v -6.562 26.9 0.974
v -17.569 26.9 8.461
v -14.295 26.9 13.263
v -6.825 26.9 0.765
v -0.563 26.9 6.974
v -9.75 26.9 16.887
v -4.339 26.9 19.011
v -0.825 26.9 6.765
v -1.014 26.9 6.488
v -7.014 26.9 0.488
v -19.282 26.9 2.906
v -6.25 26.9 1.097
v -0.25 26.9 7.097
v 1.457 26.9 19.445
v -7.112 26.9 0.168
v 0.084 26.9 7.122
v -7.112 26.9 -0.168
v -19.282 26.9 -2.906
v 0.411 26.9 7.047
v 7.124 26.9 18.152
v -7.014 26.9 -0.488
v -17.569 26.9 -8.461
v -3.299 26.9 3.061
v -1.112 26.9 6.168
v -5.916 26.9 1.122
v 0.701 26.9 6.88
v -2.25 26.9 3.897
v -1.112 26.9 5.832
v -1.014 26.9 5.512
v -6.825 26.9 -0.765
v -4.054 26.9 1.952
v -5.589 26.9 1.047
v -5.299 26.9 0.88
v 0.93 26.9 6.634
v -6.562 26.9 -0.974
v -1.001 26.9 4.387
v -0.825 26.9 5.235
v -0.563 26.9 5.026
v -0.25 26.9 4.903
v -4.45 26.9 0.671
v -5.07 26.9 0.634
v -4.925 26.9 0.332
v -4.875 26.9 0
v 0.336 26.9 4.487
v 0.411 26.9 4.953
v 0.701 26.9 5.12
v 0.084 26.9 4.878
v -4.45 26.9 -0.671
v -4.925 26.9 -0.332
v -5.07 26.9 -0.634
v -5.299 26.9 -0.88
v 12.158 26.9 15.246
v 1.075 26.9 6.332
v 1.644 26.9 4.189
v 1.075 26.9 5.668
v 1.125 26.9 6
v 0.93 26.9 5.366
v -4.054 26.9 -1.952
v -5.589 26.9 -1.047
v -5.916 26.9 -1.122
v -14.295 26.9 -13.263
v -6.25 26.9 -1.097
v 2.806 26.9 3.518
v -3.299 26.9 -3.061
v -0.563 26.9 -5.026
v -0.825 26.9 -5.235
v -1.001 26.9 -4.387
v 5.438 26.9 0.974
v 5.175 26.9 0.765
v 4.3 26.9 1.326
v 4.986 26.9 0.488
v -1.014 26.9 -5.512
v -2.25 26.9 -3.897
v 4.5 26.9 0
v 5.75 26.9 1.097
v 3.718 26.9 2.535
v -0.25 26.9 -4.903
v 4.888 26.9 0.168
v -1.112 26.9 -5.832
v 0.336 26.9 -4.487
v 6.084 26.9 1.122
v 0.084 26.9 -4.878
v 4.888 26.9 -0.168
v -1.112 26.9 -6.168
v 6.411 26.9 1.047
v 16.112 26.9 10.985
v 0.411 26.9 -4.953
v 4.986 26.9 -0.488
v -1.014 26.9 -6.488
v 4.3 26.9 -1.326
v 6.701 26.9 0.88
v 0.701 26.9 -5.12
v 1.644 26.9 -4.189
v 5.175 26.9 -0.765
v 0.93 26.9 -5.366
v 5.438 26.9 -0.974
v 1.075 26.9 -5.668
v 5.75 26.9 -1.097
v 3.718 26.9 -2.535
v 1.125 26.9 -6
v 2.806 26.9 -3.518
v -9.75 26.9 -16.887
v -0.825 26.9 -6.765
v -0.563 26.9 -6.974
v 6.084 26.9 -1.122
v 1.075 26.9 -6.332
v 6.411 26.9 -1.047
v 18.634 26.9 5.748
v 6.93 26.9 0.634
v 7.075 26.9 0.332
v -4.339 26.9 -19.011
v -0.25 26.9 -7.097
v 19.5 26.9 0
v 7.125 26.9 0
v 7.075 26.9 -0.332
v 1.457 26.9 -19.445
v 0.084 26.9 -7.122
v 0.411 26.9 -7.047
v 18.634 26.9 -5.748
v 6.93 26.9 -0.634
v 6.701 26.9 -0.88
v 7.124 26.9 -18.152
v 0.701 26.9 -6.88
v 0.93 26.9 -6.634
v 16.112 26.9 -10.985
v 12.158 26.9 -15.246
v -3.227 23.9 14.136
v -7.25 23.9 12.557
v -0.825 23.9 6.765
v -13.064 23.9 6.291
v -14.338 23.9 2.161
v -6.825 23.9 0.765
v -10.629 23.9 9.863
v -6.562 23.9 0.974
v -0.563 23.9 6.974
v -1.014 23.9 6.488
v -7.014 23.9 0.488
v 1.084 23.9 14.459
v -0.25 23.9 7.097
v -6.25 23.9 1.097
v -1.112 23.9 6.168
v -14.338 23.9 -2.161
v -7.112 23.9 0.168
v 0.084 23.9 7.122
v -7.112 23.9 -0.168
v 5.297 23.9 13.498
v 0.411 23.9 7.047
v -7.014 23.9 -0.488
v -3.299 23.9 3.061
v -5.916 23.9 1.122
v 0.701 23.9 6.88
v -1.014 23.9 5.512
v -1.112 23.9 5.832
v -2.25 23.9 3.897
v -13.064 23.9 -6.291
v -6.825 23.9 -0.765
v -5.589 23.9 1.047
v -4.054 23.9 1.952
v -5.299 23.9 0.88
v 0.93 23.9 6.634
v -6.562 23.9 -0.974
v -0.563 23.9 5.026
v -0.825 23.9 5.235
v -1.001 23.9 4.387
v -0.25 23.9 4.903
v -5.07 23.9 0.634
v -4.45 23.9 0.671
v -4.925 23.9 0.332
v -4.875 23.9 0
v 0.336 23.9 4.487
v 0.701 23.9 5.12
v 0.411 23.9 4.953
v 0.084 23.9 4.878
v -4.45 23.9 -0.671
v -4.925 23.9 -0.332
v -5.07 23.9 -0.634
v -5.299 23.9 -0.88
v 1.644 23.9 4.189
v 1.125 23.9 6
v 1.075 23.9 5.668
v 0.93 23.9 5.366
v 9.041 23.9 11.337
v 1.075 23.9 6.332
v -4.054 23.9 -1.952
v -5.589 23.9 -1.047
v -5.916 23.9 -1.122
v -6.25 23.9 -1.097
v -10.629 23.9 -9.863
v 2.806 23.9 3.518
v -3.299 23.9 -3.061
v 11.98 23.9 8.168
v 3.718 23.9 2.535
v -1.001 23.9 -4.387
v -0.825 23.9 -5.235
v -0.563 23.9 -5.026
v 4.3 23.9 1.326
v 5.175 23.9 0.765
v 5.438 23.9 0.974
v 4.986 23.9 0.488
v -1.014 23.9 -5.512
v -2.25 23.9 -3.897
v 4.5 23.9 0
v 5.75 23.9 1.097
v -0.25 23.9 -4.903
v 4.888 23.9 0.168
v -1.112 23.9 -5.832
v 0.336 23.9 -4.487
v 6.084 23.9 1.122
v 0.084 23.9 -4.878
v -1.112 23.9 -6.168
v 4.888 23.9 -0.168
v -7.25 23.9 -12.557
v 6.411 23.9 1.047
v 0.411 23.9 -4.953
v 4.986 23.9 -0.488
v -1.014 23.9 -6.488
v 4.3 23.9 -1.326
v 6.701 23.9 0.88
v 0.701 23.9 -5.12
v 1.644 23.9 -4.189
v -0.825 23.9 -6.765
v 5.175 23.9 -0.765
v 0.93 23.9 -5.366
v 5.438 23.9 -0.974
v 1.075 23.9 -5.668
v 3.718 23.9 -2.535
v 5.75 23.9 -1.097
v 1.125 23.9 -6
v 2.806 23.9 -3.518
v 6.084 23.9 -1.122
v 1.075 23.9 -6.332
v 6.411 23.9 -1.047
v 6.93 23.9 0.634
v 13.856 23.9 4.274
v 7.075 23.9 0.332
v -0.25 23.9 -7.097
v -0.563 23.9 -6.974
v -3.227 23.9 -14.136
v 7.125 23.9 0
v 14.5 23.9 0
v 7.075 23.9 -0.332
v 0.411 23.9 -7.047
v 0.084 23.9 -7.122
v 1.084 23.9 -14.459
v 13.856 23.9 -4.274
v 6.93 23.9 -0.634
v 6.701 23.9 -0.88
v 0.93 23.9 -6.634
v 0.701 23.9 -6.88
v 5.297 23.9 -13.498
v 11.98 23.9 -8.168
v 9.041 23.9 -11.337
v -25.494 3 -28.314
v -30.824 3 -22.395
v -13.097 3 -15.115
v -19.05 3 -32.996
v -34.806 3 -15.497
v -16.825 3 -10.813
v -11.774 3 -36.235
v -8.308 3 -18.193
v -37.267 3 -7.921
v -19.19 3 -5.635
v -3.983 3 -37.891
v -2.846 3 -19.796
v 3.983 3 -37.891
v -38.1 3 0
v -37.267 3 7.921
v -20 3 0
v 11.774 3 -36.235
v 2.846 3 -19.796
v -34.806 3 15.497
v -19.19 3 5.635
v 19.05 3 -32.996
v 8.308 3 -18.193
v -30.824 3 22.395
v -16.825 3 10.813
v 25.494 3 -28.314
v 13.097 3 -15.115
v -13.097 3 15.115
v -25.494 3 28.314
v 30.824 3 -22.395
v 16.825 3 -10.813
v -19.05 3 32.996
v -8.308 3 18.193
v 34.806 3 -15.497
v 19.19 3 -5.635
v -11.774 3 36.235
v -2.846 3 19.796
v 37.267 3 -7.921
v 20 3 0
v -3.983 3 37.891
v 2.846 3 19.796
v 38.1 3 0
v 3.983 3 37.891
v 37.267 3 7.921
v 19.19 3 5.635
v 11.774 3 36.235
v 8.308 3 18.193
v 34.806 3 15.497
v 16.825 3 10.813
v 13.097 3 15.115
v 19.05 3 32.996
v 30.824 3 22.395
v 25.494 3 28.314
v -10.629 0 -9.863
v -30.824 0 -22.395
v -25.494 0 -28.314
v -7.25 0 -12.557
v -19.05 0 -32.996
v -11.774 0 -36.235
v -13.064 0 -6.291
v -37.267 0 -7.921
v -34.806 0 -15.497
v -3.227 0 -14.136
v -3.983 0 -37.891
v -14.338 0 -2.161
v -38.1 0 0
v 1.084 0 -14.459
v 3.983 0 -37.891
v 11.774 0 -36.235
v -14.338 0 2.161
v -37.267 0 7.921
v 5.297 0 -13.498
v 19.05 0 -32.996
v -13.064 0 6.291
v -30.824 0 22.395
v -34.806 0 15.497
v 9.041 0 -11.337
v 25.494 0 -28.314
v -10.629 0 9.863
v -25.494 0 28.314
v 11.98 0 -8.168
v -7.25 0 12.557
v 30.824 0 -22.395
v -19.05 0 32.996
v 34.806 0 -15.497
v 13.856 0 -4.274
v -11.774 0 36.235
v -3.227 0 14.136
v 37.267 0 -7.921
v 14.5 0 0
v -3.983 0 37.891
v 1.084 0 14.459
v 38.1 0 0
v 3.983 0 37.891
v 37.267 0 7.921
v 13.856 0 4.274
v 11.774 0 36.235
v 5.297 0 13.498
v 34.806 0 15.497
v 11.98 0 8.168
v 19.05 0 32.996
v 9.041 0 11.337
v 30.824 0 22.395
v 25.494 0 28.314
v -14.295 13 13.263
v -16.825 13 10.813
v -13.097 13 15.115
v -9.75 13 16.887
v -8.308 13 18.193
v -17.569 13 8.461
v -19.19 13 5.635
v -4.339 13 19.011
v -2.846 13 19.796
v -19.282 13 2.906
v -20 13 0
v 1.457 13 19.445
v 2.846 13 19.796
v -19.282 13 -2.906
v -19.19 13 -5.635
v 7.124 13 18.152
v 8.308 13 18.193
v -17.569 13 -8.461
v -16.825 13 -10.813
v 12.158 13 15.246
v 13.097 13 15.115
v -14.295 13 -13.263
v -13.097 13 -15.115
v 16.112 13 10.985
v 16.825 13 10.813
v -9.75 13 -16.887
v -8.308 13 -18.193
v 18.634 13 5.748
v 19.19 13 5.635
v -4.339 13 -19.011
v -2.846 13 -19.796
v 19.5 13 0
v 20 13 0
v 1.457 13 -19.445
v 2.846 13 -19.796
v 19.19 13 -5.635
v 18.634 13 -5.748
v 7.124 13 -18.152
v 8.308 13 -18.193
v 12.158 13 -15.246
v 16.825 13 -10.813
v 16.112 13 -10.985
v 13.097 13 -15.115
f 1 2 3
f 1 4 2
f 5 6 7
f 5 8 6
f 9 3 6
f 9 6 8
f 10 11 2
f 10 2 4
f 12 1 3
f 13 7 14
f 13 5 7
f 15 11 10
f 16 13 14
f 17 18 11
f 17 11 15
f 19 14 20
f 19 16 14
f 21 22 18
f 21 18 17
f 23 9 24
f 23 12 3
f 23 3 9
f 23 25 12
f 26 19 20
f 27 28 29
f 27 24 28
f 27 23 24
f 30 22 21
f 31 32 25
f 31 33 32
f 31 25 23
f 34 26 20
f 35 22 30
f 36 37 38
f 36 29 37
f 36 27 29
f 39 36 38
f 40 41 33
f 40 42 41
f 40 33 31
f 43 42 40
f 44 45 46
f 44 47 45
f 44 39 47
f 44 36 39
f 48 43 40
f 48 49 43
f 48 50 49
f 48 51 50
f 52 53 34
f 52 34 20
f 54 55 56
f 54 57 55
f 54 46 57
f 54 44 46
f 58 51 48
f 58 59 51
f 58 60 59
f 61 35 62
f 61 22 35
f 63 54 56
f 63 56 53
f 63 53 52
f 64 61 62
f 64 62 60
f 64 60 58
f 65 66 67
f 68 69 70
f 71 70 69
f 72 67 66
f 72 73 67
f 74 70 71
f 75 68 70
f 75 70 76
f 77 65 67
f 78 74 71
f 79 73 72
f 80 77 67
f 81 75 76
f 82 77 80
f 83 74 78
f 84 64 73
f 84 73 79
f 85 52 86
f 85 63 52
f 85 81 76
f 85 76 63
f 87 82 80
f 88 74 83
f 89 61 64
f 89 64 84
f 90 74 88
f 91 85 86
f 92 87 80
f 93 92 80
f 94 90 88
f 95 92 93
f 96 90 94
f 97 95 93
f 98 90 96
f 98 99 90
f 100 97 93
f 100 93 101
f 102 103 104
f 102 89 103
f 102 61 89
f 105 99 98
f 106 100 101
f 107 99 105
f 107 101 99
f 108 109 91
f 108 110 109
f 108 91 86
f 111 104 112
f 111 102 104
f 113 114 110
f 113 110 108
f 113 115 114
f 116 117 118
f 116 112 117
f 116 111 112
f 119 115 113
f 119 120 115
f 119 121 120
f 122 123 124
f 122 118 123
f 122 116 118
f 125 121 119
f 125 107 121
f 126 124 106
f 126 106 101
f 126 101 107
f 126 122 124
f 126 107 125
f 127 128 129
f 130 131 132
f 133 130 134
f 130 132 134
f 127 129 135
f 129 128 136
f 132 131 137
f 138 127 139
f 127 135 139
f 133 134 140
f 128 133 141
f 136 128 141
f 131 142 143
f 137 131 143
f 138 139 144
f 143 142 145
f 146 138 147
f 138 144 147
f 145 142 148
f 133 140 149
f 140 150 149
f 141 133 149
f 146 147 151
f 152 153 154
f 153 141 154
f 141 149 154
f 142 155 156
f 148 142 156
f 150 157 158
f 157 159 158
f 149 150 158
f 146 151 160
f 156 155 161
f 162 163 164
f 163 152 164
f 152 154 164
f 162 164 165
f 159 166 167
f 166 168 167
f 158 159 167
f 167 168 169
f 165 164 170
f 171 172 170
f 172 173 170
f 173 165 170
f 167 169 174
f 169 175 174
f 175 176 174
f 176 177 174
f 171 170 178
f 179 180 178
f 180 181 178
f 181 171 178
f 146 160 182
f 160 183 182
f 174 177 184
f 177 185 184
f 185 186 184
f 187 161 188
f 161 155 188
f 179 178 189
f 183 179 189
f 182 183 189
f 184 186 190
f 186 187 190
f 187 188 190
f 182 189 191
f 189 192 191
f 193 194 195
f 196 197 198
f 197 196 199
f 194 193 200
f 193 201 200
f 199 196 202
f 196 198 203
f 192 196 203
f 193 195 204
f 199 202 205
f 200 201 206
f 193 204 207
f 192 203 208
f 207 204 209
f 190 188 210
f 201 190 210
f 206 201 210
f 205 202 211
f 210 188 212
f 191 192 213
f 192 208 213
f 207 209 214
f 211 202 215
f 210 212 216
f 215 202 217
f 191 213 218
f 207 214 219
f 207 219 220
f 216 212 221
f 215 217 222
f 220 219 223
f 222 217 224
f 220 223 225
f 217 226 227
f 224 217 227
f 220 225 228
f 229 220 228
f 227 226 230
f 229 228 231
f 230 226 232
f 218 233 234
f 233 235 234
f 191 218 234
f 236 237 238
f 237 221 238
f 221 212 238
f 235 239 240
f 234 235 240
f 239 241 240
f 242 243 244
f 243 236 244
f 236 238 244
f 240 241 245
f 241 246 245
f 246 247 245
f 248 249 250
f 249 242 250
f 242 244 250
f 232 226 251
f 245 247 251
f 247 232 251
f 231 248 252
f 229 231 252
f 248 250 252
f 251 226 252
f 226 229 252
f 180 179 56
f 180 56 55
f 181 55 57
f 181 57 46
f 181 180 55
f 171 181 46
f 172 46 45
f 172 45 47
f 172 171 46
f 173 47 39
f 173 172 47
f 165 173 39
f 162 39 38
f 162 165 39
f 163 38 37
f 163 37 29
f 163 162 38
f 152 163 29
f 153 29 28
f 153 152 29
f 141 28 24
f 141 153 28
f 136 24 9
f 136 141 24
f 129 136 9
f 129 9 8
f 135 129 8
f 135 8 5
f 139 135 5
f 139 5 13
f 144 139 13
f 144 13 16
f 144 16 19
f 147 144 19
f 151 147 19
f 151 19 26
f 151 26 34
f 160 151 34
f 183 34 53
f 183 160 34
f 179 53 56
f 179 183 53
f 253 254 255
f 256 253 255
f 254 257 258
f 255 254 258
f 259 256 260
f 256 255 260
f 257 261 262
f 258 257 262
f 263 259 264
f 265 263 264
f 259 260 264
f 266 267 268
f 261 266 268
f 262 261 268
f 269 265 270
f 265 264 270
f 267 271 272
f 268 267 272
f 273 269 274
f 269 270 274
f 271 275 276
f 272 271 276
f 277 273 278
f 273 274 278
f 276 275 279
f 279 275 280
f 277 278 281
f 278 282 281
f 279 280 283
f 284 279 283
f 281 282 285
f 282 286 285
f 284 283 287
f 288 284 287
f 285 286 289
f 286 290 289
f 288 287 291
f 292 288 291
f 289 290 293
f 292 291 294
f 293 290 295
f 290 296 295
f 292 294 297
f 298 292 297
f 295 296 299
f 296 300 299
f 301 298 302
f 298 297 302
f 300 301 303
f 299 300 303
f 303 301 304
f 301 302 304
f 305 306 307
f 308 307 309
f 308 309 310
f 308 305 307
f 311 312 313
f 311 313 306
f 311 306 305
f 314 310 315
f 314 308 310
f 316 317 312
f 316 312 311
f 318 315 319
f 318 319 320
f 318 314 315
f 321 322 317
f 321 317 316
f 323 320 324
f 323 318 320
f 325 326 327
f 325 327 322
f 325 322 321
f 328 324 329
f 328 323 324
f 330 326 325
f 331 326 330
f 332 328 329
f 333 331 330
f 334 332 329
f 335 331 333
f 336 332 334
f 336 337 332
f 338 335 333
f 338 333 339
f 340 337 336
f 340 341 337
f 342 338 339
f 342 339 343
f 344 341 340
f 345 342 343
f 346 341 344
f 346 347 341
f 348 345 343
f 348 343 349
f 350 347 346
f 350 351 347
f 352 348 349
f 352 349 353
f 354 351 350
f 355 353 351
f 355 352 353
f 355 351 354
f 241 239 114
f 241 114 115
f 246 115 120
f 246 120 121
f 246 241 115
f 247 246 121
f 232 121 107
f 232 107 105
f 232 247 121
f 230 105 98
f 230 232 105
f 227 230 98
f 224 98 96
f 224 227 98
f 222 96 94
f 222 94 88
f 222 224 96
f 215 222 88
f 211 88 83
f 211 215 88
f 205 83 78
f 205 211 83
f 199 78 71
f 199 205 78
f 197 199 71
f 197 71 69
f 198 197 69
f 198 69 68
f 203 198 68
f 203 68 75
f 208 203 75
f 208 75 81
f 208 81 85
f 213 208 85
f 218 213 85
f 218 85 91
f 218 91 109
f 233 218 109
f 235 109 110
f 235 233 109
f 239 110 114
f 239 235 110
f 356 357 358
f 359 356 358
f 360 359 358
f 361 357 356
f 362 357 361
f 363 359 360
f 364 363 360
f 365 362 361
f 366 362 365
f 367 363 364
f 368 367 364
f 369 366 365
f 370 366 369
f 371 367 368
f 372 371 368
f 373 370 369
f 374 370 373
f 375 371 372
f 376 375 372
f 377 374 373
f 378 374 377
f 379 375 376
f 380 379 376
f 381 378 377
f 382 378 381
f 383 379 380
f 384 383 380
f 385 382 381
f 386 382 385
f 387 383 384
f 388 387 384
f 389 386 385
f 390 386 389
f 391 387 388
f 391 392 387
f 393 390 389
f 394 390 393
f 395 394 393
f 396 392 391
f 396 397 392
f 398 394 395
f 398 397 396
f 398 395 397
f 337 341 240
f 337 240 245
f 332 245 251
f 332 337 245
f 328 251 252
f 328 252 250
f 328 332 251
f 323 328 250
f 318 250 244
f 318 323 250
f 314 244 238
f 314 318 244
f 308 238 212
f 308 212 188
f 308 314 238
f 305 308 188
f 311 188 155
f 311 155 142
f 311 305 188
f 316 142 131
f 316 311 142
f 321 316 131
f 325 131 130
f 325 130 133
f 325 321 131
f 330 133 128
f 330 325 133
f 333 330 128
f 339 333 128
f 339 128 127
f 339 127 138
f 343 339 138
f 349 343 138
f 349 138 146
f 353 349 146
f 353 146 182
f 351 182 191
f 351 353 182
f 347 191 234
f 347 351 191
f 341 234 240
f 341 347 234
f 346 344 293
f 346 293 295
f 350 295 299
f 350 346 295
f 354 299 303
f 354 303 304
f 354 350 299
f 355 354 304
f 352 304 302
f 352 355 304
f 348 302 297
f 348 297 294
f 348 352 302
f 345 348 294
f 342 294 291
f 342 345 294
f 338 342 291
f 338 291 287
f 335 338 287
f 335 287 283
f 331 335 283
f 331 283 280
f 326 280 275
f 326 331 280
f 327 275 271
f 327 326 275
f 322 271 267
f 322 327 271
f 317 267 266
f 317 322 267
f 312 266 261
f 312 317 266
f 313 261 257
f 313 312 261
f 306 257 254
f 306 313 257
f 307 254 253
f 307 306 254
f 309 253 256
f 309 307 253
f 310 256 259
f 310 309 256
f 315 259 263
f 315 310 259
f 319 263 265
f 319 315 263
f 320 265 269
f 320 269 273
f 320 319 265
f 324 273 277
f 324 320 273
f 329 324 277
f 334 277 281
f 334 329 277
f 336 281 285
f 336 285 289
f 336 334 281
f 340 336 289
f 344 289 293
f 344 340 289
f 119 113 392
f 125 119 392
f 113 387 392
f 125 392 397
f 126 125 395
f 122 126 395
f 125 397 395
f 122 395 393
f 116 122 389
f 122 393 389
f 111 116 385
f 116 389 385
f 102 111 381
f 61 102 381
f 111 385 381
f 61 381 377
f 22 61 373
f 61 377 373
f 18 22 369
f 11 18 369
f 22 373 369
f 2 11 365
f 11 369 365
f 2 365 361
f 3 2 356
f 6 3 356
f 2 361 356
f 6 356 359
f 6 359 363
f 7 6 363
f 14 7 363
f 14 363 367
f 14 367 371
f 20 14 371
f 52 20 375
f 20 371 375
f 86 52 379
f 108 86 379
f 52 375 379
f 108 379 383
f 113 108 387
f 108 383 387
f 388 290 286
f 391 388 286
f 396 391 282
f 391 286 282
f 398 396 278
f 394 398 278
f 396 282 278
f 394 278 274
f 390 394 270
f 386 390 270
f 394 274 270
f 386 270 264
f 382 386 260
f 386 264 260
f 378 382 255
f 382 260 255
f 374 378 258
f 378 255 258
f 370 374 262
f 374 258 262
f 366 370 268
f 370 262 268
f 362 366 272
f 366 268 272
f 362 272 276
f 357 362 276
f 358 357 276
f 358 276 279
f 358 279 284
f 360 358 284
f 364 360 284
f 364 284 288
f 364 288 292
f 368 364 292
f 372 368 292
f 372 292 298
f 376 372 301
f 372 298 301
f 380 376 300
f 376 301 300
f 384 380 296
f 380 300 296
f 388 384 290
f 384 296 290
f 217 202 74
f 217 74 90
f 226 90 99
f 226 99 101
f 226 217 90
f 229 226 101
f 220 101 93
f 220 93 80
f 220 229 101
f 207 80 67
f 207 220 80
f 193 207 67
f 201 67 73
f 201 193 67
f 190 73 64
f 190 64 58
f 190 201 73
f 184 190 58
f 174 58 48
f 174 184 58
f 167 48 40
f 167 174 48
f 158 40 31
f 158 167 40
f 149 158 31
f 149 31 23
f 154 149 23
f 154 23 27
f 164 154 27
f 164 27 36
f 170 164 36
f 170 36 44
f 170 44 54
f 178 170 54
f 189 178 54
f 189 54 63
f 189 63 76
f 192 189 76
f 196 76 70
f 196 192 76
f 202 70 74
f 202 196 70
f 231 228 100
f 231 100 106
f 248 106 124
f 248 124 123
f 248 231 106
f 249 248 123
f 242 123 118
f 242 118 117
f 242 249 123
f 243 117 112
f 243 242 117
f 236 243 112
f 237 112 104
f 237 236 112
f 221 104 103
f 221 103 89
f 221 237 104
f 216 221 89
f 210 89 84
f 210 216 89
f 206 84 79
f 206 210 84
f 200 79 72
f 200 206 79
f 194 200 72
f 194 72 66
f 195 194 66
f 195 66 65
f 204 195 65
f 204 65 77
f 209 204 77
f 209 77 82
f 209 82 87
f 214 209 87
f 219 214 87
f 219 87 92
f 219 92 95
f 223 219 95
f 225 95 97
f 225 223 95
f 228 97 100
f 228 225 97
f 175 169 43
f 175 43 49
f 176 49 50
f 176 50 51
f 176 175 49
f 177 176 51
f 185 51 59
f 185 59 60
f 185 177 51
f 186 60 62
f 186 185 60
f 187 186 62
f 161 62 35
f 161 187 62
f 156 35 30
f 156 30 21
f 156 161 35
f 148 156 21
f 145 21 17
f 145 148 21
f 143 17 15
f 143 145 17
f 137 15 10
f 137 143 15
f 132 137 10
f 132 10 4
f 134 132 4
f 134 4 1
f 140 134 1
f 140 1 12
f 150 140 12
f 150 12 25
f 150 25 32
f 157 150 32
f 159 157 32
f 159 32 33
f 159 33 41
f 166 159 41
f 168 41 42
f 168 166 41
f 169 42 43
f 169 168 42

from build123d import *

# Parameters (mm, degrees)
SKETCH1_R           = 19.5
SKETCH1_R_2         = 14.5
BOSS_EXTRUDE1_DEPTH = 23.9
SKETCH2_R           = 38.1
SKETCH2_R_2         = 19.5
BOSS_EXTRUDE2_DEPTH = 3
SKETCH3_R           = 20
SKETCH3_R_2         = 19.5
BOSS_EXTRUDE3_DEPTH = 10
SKETCH4_R           = 19.5
SKETCH4_R_2         = 4.5
SKETCH4_R_3         = 1.125
BOSS_EXTRUDE4_DEPTH = 3


with BuildPart() as part:
    # Sketch1 → Boss-Extrude1 (new body)
    with BuildSketch(Plane(origin=(0, 0, 0), x_dir=(1, 0, 0), z_dir=(0, 1, 0))):
        Circle(SKETCH1_R)
        Circle(SKETCH1_R_2, mode=Mode.SUBTRACT)
    extrude(amount=BOSS_EXTRUDE1_DEPTH)

    # Sketch2 → Boss-Extrude2 (add)
    with BuildSketch(Plane.XZ):
        Circle(SKETCH2_R)
        Circle(SKETCH2_R_2, mode=Mode.SUBTRACT)
    extrude(amount=-BOSS_EXTRUDE2_DEPTH)

    # Sketch3 → Boss-Extrude3 (add)
    with BuildSketch(Plane(origin=(0, 3, 0), x_dir=(1, 0, 0), z_dir=(0, 1, 0))):
        Circle(SKETCH3_R)
        Circle(SKETCH3_R_2, mode=Mode.SUBTRACT)
    extrude(amount=BOSS_EXTRUDE3_DEPTH)

    # Sketch4 → Boss-Extrude4 (add)
    with BuildSketch(Plane(origin=(0, 23.9, 0), x_dir=(1, 0, 0), z_dir=(0, 1, 0))):
        Circle(SKETCH4_R)
        Circle(SKETCH4_R_2, mode=Mode.SUBTRACT)
        with Locations((0, 6)):
            Circle(SKETCH4_R_3, mode=Mode.SUBTRACT)
        with Locations((6, 0)):
            Circle(SKETCH4_R_3, mode=Mode.SUBTRACT)
        with Locations((0, -6)):
            Circle(SKETCH4_R_3, mode=Mode.SUBTRACT)
        with Locations((-6, 0)):
            Circle(SKETCH4_R_3, mode=Mode.SUBTRACT)
    extrude(amount=BOSS_EXTRUDE4_DEPTH)


solid = part.part
